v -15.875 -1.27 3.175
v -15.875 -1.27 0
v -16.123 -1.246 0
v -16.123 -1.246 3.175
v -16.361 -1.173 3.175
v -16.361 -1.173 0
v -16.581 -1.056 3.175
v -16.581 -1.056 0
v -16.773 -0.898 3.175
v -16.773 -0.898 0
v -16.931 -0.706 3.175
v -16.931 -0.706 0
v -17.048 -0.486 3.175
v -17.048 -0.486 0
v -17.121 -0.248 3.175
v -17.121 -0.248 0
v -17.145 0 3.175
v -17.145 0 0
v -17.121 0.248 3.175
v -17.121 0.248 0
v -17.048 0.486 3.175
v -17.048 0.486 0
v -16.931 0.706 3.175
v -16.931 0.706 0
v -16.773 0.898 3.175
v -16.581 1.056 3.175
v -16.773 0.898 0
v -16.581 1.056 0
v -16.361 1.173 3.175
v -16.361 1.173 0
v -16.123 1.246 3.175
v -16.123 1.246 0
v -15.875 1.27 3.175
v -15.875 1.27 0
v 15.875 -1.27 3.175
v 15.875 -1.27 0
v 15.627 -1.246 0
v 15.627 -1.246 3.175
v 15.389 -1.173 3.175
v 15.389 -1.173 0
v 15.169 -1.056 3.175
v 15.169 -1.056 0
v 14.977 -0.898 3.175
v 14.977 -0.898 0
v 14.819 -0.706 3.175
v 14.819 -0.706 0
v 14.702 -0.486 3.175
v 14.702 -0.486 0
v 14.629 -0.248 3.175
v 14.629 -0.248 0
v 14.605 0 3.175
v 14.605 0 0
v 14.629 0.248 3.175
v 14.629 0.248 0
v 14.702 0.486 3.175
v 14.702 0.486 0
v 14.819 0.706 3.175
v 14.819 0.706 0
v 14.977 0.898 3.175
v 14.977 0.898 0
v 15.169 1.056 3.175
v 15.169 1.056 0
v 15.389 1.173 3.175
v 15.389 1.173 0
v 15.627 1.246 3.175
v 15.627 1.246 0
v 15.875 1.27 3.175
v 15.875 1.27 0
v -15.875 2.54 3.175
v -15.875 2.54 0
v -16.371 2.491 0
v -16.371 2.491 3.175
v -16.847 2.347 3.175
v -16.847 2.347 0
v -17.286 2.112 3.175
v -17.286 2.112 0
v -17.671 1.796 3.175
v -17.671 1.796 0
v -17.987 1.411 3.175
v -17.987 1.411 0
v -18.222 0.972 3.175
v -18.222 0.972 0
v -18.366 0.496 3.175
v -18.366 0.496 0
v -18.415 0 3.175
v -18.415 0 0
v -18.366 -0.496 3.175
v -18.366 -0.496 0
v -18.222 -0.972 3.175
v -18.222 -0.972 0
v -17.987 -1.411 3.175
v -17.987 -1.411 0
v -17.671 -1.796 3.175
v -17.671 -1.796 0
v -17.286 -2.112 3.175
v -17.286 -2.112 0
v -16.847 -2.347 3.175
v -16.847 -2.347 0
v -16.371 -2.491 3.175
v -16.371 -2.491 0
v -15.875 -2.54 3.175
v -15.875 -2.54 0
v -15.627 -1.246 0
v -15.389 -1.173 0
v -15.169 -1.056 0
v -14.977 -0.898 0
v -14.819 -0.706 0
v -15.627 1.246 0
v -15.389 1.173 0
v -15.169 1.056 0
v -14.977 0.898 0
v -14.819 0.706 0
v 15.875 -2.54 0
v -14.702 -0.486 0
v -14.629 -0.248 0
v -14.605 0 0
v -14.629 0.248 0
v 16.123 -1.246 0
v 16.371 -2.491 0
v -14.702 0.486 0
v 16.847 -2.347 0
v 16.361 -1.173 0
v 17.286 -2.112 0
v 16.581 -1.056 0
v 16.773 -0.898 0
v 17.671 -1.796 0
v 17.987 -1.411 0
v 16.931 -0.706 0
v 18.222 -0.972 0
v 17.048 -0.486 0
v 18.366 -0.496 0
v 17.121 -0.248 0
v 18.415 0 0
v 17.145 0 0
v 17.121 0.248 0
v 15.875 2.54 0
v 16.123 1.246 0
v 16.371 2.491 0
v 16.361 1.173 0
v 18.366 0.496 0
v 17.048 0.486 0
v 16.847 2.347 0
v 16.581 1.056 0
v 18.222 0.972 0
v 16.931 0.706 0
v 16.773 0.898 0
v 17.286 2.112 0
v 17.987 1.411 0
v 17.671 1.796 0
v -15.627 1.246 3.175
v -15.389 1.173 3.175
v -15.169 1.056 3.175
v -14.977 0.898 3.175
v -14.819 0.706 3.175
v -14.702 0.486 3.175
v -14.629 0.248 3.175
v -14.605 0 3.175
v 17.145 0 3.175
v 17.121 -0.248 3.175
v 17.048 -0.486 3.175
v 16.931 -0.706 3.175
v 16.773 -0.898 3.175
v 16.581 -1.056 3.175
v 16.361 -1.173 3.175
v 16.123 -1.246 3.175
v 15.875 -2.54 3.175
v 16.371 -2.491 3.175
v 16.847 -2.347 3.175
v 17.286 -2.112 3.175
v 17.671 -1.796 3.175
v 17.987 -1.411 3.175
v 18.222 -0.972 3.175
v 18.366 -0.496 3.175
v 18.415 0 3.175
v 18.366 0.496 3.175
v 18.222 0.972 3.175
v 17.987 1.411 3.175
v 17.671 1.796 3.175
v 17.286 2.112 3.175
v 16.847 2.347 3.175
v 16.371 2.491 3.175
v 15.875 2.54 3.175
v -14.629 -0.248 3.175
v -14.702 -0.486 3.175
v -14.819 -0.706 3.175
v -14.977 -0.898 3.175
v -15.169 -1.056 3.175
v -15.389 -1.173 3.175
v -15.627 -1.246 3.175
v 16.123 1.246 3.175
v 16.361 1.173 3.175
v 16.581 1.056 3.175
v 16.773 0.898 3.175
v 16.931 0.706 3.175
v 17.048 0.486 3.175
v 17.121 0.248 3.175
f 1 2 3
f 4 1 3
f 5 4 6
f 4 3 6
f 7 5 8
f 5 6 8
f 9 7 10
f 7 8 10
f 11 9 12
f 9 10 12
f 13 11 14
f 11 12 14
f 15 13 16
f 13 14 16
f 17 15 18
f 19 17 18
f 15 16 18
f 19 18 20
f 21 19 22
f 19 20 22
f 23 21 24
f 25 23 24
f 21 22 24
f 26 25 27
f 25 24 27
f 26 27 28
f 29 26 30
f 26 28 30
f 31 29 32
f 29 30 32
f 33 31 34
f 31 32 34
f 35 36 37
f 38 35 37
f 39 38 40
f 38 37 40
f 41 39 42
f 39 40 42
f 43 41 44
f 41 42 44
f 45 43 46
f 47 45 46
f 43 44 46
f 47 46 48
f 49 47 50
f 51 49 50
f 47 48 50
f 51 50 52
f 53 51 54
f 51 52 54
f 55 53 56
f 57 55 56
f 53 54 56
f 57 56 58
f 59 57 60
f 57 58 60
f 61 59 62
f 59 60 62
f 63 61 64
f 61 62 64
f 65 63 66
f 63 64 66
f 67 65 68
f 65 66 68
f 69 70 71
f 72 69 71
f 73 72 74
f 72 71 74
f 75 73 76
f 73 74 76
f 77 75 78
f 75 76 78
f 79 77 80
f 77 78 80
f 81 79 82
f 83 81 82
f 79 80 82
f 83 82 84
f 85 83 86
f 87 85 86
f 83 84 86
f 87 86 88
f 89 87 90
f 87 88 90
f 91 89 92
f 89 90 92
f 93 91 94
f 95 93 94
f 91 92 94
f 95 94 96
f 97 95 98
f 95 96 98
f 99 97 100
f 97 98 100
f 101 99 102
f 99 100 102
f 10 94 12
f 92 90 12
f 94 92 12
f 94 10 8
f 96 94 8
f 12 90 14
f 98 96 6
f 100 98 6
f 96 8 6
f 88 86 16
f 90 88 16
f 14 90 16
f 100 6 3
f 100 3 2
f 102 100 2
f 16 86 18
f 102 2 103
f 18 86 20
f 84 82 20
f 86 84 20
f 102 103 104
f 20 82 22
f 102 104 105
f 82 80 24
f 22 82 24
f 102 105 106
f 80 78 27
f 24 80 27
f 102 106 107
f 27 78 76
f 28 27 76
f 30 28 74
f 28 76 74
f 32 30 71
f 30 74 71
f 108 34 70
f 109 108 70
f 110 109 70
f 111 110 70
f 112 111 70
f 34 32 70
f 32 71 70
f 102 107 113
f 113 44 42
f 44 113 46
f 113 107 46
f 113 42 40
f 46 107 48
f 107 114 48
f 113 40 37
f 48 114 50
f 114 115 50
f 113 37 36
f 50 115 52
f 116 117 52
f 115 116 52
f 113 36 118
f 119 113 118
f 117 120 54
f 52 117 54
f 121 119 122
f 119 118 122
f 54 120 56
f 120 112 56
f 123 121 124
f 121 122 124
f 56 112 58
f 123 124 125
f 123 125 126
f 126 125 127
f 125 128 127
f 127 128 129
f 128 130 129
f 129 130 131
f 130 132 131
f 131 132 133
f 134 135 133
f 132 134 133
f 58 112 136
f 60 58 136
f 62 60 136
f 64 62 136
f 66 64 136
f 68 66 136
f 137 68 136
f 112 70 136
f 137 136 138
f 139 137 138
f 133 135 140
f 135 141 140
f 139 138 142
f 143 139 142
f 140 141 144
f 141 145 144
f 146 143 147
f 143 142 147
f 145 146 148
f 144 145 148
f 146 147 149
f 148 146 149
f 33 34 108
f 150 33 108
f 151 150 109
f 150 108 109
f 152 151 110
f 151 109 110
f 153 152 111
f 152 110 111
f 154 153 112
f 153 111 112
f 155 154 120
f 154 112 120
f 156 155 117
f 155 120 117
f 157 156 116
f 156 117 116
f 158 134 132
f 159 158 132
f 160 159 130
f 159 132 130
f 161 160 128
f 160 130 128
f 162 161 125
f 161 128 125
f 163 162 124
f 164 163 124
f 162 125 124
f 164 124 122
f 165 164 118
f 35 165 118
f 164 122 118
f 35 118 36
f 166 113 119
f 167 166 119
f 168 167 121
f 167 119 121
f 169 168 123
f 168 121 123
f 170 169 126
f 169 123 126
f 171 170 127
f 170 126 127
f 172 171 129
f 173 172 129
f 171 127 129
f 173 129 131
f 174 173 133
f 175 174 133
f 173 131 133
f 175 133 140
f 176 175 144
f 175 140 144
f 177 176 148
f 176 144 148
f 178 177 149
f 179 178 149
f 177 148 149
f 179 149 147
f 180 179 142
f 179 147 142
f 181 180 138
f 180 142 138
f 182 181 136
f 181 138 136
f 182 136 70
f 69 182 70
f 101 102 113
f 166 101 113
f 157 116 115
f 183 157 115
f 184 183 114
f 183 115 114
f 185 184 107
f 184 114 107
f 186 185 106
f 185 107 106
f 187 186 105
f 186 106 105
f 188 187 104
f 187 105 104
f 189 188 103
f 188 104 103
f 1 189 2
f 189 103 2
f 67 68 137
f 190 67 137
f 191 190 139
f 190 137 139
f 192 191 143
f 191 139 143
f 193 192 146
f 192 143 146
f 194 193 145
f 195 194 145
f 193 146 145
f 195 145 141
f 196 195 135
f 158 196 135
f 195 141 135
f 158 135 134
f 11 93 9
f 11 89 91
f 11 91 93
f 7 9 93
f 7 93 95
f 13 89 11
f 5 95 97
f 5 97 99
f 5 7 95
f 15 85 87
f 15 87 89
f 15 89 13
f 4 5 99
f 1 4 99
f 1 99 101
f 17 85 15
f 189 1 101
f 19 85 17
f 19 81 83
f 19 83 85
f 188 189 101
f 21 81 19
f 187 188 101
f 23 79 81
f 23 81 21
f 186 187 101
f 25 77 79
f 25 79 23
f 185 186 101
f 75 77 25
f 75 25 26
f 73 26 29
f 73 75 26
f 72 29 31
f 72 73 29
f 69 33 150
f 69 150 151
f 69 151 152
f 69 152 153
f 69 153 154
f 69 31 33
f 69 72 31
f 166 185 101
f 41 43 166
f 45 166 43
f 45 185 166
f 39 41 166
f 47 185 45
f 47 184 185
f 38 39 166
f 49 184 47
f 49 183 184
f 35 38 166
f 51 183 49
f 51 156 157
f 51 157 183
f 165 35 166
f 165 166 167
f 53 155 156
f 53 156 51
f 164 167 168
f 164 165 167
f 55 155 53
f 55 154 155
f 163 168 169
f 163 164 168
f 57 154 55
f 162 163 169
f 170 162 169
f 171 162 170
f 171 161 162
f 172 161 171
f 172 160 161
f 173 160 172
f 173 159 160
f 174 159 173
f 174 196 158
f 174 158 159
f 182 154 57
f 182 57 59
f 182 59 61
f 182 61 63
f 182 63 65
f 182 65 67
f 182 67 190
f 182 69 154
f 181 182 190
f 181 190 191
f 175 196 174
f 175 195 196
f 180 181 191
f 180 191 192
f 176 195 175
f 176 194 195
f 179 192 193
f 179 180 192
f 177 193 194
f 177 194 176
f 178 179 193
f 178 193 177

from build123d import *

# Parameters (mm, degrees)
F1_DEPTH = 3.175


with BuildPart() as f1:
    # F0 (on Top) → F1 (new body)
    with BuildSketch(Plane.XY):
        with BuildLine():
            Line((15.875, 1.27), (15.875, 2.54))
            Line((15.875, 2.54), (-15.875, 2.54))
            Line((-15.875, 2.54), (-15.875, 1.27))
            ThreePointArc((-15.875, 1.27), (-14.976974, 0.898026), (-14.605, 0))
            ThreePointArc((-14.605, 0), (-14.976974, -0.898026), (-15.875, -1.27))
            Line((-15.875, -1.27), (-15.875, -2.54))
            Line((-15.875, -2.54), (15.875, -2.54))
            Line((15.875, -2.54), (15.875, -1.27))
            ThreePointArc((15.875, -1.27), (14.605, 0), (15.875, 1.27))
        make_face()
        with BuildLine():
            ThreePointArc((15.875, -2.54), (18.415, 0), (15.875, 2.54))
            Line((15.875, 2.54), (15.875, 1.27))
            ThreePointArc((15.875, 1.27), (16.773026, 0.898026), (17.145, 0))
            ThreePointArc((17.145, 0), (16.773026, -0.898026), (15.875, -1.27))
            Line((15.875, -1.27), (15.875, -2.54))
        make_face()
        with BuildLine():
            Line((-15.875, 1.27), (-15.875, 2.54))
            ThreePointArc((-15.875, 2.54), (-18.415, 0), (-15.875, -2.54))
            Line((-15.875, -2.54), (-15.875, -1.27))
            ThreePointArc((-15.875, -1.27), (-17.145, 0), (-15.875, 1.27))
        make_face()
    extrude(amount=F1_DEPTH)


solid = f1.part
